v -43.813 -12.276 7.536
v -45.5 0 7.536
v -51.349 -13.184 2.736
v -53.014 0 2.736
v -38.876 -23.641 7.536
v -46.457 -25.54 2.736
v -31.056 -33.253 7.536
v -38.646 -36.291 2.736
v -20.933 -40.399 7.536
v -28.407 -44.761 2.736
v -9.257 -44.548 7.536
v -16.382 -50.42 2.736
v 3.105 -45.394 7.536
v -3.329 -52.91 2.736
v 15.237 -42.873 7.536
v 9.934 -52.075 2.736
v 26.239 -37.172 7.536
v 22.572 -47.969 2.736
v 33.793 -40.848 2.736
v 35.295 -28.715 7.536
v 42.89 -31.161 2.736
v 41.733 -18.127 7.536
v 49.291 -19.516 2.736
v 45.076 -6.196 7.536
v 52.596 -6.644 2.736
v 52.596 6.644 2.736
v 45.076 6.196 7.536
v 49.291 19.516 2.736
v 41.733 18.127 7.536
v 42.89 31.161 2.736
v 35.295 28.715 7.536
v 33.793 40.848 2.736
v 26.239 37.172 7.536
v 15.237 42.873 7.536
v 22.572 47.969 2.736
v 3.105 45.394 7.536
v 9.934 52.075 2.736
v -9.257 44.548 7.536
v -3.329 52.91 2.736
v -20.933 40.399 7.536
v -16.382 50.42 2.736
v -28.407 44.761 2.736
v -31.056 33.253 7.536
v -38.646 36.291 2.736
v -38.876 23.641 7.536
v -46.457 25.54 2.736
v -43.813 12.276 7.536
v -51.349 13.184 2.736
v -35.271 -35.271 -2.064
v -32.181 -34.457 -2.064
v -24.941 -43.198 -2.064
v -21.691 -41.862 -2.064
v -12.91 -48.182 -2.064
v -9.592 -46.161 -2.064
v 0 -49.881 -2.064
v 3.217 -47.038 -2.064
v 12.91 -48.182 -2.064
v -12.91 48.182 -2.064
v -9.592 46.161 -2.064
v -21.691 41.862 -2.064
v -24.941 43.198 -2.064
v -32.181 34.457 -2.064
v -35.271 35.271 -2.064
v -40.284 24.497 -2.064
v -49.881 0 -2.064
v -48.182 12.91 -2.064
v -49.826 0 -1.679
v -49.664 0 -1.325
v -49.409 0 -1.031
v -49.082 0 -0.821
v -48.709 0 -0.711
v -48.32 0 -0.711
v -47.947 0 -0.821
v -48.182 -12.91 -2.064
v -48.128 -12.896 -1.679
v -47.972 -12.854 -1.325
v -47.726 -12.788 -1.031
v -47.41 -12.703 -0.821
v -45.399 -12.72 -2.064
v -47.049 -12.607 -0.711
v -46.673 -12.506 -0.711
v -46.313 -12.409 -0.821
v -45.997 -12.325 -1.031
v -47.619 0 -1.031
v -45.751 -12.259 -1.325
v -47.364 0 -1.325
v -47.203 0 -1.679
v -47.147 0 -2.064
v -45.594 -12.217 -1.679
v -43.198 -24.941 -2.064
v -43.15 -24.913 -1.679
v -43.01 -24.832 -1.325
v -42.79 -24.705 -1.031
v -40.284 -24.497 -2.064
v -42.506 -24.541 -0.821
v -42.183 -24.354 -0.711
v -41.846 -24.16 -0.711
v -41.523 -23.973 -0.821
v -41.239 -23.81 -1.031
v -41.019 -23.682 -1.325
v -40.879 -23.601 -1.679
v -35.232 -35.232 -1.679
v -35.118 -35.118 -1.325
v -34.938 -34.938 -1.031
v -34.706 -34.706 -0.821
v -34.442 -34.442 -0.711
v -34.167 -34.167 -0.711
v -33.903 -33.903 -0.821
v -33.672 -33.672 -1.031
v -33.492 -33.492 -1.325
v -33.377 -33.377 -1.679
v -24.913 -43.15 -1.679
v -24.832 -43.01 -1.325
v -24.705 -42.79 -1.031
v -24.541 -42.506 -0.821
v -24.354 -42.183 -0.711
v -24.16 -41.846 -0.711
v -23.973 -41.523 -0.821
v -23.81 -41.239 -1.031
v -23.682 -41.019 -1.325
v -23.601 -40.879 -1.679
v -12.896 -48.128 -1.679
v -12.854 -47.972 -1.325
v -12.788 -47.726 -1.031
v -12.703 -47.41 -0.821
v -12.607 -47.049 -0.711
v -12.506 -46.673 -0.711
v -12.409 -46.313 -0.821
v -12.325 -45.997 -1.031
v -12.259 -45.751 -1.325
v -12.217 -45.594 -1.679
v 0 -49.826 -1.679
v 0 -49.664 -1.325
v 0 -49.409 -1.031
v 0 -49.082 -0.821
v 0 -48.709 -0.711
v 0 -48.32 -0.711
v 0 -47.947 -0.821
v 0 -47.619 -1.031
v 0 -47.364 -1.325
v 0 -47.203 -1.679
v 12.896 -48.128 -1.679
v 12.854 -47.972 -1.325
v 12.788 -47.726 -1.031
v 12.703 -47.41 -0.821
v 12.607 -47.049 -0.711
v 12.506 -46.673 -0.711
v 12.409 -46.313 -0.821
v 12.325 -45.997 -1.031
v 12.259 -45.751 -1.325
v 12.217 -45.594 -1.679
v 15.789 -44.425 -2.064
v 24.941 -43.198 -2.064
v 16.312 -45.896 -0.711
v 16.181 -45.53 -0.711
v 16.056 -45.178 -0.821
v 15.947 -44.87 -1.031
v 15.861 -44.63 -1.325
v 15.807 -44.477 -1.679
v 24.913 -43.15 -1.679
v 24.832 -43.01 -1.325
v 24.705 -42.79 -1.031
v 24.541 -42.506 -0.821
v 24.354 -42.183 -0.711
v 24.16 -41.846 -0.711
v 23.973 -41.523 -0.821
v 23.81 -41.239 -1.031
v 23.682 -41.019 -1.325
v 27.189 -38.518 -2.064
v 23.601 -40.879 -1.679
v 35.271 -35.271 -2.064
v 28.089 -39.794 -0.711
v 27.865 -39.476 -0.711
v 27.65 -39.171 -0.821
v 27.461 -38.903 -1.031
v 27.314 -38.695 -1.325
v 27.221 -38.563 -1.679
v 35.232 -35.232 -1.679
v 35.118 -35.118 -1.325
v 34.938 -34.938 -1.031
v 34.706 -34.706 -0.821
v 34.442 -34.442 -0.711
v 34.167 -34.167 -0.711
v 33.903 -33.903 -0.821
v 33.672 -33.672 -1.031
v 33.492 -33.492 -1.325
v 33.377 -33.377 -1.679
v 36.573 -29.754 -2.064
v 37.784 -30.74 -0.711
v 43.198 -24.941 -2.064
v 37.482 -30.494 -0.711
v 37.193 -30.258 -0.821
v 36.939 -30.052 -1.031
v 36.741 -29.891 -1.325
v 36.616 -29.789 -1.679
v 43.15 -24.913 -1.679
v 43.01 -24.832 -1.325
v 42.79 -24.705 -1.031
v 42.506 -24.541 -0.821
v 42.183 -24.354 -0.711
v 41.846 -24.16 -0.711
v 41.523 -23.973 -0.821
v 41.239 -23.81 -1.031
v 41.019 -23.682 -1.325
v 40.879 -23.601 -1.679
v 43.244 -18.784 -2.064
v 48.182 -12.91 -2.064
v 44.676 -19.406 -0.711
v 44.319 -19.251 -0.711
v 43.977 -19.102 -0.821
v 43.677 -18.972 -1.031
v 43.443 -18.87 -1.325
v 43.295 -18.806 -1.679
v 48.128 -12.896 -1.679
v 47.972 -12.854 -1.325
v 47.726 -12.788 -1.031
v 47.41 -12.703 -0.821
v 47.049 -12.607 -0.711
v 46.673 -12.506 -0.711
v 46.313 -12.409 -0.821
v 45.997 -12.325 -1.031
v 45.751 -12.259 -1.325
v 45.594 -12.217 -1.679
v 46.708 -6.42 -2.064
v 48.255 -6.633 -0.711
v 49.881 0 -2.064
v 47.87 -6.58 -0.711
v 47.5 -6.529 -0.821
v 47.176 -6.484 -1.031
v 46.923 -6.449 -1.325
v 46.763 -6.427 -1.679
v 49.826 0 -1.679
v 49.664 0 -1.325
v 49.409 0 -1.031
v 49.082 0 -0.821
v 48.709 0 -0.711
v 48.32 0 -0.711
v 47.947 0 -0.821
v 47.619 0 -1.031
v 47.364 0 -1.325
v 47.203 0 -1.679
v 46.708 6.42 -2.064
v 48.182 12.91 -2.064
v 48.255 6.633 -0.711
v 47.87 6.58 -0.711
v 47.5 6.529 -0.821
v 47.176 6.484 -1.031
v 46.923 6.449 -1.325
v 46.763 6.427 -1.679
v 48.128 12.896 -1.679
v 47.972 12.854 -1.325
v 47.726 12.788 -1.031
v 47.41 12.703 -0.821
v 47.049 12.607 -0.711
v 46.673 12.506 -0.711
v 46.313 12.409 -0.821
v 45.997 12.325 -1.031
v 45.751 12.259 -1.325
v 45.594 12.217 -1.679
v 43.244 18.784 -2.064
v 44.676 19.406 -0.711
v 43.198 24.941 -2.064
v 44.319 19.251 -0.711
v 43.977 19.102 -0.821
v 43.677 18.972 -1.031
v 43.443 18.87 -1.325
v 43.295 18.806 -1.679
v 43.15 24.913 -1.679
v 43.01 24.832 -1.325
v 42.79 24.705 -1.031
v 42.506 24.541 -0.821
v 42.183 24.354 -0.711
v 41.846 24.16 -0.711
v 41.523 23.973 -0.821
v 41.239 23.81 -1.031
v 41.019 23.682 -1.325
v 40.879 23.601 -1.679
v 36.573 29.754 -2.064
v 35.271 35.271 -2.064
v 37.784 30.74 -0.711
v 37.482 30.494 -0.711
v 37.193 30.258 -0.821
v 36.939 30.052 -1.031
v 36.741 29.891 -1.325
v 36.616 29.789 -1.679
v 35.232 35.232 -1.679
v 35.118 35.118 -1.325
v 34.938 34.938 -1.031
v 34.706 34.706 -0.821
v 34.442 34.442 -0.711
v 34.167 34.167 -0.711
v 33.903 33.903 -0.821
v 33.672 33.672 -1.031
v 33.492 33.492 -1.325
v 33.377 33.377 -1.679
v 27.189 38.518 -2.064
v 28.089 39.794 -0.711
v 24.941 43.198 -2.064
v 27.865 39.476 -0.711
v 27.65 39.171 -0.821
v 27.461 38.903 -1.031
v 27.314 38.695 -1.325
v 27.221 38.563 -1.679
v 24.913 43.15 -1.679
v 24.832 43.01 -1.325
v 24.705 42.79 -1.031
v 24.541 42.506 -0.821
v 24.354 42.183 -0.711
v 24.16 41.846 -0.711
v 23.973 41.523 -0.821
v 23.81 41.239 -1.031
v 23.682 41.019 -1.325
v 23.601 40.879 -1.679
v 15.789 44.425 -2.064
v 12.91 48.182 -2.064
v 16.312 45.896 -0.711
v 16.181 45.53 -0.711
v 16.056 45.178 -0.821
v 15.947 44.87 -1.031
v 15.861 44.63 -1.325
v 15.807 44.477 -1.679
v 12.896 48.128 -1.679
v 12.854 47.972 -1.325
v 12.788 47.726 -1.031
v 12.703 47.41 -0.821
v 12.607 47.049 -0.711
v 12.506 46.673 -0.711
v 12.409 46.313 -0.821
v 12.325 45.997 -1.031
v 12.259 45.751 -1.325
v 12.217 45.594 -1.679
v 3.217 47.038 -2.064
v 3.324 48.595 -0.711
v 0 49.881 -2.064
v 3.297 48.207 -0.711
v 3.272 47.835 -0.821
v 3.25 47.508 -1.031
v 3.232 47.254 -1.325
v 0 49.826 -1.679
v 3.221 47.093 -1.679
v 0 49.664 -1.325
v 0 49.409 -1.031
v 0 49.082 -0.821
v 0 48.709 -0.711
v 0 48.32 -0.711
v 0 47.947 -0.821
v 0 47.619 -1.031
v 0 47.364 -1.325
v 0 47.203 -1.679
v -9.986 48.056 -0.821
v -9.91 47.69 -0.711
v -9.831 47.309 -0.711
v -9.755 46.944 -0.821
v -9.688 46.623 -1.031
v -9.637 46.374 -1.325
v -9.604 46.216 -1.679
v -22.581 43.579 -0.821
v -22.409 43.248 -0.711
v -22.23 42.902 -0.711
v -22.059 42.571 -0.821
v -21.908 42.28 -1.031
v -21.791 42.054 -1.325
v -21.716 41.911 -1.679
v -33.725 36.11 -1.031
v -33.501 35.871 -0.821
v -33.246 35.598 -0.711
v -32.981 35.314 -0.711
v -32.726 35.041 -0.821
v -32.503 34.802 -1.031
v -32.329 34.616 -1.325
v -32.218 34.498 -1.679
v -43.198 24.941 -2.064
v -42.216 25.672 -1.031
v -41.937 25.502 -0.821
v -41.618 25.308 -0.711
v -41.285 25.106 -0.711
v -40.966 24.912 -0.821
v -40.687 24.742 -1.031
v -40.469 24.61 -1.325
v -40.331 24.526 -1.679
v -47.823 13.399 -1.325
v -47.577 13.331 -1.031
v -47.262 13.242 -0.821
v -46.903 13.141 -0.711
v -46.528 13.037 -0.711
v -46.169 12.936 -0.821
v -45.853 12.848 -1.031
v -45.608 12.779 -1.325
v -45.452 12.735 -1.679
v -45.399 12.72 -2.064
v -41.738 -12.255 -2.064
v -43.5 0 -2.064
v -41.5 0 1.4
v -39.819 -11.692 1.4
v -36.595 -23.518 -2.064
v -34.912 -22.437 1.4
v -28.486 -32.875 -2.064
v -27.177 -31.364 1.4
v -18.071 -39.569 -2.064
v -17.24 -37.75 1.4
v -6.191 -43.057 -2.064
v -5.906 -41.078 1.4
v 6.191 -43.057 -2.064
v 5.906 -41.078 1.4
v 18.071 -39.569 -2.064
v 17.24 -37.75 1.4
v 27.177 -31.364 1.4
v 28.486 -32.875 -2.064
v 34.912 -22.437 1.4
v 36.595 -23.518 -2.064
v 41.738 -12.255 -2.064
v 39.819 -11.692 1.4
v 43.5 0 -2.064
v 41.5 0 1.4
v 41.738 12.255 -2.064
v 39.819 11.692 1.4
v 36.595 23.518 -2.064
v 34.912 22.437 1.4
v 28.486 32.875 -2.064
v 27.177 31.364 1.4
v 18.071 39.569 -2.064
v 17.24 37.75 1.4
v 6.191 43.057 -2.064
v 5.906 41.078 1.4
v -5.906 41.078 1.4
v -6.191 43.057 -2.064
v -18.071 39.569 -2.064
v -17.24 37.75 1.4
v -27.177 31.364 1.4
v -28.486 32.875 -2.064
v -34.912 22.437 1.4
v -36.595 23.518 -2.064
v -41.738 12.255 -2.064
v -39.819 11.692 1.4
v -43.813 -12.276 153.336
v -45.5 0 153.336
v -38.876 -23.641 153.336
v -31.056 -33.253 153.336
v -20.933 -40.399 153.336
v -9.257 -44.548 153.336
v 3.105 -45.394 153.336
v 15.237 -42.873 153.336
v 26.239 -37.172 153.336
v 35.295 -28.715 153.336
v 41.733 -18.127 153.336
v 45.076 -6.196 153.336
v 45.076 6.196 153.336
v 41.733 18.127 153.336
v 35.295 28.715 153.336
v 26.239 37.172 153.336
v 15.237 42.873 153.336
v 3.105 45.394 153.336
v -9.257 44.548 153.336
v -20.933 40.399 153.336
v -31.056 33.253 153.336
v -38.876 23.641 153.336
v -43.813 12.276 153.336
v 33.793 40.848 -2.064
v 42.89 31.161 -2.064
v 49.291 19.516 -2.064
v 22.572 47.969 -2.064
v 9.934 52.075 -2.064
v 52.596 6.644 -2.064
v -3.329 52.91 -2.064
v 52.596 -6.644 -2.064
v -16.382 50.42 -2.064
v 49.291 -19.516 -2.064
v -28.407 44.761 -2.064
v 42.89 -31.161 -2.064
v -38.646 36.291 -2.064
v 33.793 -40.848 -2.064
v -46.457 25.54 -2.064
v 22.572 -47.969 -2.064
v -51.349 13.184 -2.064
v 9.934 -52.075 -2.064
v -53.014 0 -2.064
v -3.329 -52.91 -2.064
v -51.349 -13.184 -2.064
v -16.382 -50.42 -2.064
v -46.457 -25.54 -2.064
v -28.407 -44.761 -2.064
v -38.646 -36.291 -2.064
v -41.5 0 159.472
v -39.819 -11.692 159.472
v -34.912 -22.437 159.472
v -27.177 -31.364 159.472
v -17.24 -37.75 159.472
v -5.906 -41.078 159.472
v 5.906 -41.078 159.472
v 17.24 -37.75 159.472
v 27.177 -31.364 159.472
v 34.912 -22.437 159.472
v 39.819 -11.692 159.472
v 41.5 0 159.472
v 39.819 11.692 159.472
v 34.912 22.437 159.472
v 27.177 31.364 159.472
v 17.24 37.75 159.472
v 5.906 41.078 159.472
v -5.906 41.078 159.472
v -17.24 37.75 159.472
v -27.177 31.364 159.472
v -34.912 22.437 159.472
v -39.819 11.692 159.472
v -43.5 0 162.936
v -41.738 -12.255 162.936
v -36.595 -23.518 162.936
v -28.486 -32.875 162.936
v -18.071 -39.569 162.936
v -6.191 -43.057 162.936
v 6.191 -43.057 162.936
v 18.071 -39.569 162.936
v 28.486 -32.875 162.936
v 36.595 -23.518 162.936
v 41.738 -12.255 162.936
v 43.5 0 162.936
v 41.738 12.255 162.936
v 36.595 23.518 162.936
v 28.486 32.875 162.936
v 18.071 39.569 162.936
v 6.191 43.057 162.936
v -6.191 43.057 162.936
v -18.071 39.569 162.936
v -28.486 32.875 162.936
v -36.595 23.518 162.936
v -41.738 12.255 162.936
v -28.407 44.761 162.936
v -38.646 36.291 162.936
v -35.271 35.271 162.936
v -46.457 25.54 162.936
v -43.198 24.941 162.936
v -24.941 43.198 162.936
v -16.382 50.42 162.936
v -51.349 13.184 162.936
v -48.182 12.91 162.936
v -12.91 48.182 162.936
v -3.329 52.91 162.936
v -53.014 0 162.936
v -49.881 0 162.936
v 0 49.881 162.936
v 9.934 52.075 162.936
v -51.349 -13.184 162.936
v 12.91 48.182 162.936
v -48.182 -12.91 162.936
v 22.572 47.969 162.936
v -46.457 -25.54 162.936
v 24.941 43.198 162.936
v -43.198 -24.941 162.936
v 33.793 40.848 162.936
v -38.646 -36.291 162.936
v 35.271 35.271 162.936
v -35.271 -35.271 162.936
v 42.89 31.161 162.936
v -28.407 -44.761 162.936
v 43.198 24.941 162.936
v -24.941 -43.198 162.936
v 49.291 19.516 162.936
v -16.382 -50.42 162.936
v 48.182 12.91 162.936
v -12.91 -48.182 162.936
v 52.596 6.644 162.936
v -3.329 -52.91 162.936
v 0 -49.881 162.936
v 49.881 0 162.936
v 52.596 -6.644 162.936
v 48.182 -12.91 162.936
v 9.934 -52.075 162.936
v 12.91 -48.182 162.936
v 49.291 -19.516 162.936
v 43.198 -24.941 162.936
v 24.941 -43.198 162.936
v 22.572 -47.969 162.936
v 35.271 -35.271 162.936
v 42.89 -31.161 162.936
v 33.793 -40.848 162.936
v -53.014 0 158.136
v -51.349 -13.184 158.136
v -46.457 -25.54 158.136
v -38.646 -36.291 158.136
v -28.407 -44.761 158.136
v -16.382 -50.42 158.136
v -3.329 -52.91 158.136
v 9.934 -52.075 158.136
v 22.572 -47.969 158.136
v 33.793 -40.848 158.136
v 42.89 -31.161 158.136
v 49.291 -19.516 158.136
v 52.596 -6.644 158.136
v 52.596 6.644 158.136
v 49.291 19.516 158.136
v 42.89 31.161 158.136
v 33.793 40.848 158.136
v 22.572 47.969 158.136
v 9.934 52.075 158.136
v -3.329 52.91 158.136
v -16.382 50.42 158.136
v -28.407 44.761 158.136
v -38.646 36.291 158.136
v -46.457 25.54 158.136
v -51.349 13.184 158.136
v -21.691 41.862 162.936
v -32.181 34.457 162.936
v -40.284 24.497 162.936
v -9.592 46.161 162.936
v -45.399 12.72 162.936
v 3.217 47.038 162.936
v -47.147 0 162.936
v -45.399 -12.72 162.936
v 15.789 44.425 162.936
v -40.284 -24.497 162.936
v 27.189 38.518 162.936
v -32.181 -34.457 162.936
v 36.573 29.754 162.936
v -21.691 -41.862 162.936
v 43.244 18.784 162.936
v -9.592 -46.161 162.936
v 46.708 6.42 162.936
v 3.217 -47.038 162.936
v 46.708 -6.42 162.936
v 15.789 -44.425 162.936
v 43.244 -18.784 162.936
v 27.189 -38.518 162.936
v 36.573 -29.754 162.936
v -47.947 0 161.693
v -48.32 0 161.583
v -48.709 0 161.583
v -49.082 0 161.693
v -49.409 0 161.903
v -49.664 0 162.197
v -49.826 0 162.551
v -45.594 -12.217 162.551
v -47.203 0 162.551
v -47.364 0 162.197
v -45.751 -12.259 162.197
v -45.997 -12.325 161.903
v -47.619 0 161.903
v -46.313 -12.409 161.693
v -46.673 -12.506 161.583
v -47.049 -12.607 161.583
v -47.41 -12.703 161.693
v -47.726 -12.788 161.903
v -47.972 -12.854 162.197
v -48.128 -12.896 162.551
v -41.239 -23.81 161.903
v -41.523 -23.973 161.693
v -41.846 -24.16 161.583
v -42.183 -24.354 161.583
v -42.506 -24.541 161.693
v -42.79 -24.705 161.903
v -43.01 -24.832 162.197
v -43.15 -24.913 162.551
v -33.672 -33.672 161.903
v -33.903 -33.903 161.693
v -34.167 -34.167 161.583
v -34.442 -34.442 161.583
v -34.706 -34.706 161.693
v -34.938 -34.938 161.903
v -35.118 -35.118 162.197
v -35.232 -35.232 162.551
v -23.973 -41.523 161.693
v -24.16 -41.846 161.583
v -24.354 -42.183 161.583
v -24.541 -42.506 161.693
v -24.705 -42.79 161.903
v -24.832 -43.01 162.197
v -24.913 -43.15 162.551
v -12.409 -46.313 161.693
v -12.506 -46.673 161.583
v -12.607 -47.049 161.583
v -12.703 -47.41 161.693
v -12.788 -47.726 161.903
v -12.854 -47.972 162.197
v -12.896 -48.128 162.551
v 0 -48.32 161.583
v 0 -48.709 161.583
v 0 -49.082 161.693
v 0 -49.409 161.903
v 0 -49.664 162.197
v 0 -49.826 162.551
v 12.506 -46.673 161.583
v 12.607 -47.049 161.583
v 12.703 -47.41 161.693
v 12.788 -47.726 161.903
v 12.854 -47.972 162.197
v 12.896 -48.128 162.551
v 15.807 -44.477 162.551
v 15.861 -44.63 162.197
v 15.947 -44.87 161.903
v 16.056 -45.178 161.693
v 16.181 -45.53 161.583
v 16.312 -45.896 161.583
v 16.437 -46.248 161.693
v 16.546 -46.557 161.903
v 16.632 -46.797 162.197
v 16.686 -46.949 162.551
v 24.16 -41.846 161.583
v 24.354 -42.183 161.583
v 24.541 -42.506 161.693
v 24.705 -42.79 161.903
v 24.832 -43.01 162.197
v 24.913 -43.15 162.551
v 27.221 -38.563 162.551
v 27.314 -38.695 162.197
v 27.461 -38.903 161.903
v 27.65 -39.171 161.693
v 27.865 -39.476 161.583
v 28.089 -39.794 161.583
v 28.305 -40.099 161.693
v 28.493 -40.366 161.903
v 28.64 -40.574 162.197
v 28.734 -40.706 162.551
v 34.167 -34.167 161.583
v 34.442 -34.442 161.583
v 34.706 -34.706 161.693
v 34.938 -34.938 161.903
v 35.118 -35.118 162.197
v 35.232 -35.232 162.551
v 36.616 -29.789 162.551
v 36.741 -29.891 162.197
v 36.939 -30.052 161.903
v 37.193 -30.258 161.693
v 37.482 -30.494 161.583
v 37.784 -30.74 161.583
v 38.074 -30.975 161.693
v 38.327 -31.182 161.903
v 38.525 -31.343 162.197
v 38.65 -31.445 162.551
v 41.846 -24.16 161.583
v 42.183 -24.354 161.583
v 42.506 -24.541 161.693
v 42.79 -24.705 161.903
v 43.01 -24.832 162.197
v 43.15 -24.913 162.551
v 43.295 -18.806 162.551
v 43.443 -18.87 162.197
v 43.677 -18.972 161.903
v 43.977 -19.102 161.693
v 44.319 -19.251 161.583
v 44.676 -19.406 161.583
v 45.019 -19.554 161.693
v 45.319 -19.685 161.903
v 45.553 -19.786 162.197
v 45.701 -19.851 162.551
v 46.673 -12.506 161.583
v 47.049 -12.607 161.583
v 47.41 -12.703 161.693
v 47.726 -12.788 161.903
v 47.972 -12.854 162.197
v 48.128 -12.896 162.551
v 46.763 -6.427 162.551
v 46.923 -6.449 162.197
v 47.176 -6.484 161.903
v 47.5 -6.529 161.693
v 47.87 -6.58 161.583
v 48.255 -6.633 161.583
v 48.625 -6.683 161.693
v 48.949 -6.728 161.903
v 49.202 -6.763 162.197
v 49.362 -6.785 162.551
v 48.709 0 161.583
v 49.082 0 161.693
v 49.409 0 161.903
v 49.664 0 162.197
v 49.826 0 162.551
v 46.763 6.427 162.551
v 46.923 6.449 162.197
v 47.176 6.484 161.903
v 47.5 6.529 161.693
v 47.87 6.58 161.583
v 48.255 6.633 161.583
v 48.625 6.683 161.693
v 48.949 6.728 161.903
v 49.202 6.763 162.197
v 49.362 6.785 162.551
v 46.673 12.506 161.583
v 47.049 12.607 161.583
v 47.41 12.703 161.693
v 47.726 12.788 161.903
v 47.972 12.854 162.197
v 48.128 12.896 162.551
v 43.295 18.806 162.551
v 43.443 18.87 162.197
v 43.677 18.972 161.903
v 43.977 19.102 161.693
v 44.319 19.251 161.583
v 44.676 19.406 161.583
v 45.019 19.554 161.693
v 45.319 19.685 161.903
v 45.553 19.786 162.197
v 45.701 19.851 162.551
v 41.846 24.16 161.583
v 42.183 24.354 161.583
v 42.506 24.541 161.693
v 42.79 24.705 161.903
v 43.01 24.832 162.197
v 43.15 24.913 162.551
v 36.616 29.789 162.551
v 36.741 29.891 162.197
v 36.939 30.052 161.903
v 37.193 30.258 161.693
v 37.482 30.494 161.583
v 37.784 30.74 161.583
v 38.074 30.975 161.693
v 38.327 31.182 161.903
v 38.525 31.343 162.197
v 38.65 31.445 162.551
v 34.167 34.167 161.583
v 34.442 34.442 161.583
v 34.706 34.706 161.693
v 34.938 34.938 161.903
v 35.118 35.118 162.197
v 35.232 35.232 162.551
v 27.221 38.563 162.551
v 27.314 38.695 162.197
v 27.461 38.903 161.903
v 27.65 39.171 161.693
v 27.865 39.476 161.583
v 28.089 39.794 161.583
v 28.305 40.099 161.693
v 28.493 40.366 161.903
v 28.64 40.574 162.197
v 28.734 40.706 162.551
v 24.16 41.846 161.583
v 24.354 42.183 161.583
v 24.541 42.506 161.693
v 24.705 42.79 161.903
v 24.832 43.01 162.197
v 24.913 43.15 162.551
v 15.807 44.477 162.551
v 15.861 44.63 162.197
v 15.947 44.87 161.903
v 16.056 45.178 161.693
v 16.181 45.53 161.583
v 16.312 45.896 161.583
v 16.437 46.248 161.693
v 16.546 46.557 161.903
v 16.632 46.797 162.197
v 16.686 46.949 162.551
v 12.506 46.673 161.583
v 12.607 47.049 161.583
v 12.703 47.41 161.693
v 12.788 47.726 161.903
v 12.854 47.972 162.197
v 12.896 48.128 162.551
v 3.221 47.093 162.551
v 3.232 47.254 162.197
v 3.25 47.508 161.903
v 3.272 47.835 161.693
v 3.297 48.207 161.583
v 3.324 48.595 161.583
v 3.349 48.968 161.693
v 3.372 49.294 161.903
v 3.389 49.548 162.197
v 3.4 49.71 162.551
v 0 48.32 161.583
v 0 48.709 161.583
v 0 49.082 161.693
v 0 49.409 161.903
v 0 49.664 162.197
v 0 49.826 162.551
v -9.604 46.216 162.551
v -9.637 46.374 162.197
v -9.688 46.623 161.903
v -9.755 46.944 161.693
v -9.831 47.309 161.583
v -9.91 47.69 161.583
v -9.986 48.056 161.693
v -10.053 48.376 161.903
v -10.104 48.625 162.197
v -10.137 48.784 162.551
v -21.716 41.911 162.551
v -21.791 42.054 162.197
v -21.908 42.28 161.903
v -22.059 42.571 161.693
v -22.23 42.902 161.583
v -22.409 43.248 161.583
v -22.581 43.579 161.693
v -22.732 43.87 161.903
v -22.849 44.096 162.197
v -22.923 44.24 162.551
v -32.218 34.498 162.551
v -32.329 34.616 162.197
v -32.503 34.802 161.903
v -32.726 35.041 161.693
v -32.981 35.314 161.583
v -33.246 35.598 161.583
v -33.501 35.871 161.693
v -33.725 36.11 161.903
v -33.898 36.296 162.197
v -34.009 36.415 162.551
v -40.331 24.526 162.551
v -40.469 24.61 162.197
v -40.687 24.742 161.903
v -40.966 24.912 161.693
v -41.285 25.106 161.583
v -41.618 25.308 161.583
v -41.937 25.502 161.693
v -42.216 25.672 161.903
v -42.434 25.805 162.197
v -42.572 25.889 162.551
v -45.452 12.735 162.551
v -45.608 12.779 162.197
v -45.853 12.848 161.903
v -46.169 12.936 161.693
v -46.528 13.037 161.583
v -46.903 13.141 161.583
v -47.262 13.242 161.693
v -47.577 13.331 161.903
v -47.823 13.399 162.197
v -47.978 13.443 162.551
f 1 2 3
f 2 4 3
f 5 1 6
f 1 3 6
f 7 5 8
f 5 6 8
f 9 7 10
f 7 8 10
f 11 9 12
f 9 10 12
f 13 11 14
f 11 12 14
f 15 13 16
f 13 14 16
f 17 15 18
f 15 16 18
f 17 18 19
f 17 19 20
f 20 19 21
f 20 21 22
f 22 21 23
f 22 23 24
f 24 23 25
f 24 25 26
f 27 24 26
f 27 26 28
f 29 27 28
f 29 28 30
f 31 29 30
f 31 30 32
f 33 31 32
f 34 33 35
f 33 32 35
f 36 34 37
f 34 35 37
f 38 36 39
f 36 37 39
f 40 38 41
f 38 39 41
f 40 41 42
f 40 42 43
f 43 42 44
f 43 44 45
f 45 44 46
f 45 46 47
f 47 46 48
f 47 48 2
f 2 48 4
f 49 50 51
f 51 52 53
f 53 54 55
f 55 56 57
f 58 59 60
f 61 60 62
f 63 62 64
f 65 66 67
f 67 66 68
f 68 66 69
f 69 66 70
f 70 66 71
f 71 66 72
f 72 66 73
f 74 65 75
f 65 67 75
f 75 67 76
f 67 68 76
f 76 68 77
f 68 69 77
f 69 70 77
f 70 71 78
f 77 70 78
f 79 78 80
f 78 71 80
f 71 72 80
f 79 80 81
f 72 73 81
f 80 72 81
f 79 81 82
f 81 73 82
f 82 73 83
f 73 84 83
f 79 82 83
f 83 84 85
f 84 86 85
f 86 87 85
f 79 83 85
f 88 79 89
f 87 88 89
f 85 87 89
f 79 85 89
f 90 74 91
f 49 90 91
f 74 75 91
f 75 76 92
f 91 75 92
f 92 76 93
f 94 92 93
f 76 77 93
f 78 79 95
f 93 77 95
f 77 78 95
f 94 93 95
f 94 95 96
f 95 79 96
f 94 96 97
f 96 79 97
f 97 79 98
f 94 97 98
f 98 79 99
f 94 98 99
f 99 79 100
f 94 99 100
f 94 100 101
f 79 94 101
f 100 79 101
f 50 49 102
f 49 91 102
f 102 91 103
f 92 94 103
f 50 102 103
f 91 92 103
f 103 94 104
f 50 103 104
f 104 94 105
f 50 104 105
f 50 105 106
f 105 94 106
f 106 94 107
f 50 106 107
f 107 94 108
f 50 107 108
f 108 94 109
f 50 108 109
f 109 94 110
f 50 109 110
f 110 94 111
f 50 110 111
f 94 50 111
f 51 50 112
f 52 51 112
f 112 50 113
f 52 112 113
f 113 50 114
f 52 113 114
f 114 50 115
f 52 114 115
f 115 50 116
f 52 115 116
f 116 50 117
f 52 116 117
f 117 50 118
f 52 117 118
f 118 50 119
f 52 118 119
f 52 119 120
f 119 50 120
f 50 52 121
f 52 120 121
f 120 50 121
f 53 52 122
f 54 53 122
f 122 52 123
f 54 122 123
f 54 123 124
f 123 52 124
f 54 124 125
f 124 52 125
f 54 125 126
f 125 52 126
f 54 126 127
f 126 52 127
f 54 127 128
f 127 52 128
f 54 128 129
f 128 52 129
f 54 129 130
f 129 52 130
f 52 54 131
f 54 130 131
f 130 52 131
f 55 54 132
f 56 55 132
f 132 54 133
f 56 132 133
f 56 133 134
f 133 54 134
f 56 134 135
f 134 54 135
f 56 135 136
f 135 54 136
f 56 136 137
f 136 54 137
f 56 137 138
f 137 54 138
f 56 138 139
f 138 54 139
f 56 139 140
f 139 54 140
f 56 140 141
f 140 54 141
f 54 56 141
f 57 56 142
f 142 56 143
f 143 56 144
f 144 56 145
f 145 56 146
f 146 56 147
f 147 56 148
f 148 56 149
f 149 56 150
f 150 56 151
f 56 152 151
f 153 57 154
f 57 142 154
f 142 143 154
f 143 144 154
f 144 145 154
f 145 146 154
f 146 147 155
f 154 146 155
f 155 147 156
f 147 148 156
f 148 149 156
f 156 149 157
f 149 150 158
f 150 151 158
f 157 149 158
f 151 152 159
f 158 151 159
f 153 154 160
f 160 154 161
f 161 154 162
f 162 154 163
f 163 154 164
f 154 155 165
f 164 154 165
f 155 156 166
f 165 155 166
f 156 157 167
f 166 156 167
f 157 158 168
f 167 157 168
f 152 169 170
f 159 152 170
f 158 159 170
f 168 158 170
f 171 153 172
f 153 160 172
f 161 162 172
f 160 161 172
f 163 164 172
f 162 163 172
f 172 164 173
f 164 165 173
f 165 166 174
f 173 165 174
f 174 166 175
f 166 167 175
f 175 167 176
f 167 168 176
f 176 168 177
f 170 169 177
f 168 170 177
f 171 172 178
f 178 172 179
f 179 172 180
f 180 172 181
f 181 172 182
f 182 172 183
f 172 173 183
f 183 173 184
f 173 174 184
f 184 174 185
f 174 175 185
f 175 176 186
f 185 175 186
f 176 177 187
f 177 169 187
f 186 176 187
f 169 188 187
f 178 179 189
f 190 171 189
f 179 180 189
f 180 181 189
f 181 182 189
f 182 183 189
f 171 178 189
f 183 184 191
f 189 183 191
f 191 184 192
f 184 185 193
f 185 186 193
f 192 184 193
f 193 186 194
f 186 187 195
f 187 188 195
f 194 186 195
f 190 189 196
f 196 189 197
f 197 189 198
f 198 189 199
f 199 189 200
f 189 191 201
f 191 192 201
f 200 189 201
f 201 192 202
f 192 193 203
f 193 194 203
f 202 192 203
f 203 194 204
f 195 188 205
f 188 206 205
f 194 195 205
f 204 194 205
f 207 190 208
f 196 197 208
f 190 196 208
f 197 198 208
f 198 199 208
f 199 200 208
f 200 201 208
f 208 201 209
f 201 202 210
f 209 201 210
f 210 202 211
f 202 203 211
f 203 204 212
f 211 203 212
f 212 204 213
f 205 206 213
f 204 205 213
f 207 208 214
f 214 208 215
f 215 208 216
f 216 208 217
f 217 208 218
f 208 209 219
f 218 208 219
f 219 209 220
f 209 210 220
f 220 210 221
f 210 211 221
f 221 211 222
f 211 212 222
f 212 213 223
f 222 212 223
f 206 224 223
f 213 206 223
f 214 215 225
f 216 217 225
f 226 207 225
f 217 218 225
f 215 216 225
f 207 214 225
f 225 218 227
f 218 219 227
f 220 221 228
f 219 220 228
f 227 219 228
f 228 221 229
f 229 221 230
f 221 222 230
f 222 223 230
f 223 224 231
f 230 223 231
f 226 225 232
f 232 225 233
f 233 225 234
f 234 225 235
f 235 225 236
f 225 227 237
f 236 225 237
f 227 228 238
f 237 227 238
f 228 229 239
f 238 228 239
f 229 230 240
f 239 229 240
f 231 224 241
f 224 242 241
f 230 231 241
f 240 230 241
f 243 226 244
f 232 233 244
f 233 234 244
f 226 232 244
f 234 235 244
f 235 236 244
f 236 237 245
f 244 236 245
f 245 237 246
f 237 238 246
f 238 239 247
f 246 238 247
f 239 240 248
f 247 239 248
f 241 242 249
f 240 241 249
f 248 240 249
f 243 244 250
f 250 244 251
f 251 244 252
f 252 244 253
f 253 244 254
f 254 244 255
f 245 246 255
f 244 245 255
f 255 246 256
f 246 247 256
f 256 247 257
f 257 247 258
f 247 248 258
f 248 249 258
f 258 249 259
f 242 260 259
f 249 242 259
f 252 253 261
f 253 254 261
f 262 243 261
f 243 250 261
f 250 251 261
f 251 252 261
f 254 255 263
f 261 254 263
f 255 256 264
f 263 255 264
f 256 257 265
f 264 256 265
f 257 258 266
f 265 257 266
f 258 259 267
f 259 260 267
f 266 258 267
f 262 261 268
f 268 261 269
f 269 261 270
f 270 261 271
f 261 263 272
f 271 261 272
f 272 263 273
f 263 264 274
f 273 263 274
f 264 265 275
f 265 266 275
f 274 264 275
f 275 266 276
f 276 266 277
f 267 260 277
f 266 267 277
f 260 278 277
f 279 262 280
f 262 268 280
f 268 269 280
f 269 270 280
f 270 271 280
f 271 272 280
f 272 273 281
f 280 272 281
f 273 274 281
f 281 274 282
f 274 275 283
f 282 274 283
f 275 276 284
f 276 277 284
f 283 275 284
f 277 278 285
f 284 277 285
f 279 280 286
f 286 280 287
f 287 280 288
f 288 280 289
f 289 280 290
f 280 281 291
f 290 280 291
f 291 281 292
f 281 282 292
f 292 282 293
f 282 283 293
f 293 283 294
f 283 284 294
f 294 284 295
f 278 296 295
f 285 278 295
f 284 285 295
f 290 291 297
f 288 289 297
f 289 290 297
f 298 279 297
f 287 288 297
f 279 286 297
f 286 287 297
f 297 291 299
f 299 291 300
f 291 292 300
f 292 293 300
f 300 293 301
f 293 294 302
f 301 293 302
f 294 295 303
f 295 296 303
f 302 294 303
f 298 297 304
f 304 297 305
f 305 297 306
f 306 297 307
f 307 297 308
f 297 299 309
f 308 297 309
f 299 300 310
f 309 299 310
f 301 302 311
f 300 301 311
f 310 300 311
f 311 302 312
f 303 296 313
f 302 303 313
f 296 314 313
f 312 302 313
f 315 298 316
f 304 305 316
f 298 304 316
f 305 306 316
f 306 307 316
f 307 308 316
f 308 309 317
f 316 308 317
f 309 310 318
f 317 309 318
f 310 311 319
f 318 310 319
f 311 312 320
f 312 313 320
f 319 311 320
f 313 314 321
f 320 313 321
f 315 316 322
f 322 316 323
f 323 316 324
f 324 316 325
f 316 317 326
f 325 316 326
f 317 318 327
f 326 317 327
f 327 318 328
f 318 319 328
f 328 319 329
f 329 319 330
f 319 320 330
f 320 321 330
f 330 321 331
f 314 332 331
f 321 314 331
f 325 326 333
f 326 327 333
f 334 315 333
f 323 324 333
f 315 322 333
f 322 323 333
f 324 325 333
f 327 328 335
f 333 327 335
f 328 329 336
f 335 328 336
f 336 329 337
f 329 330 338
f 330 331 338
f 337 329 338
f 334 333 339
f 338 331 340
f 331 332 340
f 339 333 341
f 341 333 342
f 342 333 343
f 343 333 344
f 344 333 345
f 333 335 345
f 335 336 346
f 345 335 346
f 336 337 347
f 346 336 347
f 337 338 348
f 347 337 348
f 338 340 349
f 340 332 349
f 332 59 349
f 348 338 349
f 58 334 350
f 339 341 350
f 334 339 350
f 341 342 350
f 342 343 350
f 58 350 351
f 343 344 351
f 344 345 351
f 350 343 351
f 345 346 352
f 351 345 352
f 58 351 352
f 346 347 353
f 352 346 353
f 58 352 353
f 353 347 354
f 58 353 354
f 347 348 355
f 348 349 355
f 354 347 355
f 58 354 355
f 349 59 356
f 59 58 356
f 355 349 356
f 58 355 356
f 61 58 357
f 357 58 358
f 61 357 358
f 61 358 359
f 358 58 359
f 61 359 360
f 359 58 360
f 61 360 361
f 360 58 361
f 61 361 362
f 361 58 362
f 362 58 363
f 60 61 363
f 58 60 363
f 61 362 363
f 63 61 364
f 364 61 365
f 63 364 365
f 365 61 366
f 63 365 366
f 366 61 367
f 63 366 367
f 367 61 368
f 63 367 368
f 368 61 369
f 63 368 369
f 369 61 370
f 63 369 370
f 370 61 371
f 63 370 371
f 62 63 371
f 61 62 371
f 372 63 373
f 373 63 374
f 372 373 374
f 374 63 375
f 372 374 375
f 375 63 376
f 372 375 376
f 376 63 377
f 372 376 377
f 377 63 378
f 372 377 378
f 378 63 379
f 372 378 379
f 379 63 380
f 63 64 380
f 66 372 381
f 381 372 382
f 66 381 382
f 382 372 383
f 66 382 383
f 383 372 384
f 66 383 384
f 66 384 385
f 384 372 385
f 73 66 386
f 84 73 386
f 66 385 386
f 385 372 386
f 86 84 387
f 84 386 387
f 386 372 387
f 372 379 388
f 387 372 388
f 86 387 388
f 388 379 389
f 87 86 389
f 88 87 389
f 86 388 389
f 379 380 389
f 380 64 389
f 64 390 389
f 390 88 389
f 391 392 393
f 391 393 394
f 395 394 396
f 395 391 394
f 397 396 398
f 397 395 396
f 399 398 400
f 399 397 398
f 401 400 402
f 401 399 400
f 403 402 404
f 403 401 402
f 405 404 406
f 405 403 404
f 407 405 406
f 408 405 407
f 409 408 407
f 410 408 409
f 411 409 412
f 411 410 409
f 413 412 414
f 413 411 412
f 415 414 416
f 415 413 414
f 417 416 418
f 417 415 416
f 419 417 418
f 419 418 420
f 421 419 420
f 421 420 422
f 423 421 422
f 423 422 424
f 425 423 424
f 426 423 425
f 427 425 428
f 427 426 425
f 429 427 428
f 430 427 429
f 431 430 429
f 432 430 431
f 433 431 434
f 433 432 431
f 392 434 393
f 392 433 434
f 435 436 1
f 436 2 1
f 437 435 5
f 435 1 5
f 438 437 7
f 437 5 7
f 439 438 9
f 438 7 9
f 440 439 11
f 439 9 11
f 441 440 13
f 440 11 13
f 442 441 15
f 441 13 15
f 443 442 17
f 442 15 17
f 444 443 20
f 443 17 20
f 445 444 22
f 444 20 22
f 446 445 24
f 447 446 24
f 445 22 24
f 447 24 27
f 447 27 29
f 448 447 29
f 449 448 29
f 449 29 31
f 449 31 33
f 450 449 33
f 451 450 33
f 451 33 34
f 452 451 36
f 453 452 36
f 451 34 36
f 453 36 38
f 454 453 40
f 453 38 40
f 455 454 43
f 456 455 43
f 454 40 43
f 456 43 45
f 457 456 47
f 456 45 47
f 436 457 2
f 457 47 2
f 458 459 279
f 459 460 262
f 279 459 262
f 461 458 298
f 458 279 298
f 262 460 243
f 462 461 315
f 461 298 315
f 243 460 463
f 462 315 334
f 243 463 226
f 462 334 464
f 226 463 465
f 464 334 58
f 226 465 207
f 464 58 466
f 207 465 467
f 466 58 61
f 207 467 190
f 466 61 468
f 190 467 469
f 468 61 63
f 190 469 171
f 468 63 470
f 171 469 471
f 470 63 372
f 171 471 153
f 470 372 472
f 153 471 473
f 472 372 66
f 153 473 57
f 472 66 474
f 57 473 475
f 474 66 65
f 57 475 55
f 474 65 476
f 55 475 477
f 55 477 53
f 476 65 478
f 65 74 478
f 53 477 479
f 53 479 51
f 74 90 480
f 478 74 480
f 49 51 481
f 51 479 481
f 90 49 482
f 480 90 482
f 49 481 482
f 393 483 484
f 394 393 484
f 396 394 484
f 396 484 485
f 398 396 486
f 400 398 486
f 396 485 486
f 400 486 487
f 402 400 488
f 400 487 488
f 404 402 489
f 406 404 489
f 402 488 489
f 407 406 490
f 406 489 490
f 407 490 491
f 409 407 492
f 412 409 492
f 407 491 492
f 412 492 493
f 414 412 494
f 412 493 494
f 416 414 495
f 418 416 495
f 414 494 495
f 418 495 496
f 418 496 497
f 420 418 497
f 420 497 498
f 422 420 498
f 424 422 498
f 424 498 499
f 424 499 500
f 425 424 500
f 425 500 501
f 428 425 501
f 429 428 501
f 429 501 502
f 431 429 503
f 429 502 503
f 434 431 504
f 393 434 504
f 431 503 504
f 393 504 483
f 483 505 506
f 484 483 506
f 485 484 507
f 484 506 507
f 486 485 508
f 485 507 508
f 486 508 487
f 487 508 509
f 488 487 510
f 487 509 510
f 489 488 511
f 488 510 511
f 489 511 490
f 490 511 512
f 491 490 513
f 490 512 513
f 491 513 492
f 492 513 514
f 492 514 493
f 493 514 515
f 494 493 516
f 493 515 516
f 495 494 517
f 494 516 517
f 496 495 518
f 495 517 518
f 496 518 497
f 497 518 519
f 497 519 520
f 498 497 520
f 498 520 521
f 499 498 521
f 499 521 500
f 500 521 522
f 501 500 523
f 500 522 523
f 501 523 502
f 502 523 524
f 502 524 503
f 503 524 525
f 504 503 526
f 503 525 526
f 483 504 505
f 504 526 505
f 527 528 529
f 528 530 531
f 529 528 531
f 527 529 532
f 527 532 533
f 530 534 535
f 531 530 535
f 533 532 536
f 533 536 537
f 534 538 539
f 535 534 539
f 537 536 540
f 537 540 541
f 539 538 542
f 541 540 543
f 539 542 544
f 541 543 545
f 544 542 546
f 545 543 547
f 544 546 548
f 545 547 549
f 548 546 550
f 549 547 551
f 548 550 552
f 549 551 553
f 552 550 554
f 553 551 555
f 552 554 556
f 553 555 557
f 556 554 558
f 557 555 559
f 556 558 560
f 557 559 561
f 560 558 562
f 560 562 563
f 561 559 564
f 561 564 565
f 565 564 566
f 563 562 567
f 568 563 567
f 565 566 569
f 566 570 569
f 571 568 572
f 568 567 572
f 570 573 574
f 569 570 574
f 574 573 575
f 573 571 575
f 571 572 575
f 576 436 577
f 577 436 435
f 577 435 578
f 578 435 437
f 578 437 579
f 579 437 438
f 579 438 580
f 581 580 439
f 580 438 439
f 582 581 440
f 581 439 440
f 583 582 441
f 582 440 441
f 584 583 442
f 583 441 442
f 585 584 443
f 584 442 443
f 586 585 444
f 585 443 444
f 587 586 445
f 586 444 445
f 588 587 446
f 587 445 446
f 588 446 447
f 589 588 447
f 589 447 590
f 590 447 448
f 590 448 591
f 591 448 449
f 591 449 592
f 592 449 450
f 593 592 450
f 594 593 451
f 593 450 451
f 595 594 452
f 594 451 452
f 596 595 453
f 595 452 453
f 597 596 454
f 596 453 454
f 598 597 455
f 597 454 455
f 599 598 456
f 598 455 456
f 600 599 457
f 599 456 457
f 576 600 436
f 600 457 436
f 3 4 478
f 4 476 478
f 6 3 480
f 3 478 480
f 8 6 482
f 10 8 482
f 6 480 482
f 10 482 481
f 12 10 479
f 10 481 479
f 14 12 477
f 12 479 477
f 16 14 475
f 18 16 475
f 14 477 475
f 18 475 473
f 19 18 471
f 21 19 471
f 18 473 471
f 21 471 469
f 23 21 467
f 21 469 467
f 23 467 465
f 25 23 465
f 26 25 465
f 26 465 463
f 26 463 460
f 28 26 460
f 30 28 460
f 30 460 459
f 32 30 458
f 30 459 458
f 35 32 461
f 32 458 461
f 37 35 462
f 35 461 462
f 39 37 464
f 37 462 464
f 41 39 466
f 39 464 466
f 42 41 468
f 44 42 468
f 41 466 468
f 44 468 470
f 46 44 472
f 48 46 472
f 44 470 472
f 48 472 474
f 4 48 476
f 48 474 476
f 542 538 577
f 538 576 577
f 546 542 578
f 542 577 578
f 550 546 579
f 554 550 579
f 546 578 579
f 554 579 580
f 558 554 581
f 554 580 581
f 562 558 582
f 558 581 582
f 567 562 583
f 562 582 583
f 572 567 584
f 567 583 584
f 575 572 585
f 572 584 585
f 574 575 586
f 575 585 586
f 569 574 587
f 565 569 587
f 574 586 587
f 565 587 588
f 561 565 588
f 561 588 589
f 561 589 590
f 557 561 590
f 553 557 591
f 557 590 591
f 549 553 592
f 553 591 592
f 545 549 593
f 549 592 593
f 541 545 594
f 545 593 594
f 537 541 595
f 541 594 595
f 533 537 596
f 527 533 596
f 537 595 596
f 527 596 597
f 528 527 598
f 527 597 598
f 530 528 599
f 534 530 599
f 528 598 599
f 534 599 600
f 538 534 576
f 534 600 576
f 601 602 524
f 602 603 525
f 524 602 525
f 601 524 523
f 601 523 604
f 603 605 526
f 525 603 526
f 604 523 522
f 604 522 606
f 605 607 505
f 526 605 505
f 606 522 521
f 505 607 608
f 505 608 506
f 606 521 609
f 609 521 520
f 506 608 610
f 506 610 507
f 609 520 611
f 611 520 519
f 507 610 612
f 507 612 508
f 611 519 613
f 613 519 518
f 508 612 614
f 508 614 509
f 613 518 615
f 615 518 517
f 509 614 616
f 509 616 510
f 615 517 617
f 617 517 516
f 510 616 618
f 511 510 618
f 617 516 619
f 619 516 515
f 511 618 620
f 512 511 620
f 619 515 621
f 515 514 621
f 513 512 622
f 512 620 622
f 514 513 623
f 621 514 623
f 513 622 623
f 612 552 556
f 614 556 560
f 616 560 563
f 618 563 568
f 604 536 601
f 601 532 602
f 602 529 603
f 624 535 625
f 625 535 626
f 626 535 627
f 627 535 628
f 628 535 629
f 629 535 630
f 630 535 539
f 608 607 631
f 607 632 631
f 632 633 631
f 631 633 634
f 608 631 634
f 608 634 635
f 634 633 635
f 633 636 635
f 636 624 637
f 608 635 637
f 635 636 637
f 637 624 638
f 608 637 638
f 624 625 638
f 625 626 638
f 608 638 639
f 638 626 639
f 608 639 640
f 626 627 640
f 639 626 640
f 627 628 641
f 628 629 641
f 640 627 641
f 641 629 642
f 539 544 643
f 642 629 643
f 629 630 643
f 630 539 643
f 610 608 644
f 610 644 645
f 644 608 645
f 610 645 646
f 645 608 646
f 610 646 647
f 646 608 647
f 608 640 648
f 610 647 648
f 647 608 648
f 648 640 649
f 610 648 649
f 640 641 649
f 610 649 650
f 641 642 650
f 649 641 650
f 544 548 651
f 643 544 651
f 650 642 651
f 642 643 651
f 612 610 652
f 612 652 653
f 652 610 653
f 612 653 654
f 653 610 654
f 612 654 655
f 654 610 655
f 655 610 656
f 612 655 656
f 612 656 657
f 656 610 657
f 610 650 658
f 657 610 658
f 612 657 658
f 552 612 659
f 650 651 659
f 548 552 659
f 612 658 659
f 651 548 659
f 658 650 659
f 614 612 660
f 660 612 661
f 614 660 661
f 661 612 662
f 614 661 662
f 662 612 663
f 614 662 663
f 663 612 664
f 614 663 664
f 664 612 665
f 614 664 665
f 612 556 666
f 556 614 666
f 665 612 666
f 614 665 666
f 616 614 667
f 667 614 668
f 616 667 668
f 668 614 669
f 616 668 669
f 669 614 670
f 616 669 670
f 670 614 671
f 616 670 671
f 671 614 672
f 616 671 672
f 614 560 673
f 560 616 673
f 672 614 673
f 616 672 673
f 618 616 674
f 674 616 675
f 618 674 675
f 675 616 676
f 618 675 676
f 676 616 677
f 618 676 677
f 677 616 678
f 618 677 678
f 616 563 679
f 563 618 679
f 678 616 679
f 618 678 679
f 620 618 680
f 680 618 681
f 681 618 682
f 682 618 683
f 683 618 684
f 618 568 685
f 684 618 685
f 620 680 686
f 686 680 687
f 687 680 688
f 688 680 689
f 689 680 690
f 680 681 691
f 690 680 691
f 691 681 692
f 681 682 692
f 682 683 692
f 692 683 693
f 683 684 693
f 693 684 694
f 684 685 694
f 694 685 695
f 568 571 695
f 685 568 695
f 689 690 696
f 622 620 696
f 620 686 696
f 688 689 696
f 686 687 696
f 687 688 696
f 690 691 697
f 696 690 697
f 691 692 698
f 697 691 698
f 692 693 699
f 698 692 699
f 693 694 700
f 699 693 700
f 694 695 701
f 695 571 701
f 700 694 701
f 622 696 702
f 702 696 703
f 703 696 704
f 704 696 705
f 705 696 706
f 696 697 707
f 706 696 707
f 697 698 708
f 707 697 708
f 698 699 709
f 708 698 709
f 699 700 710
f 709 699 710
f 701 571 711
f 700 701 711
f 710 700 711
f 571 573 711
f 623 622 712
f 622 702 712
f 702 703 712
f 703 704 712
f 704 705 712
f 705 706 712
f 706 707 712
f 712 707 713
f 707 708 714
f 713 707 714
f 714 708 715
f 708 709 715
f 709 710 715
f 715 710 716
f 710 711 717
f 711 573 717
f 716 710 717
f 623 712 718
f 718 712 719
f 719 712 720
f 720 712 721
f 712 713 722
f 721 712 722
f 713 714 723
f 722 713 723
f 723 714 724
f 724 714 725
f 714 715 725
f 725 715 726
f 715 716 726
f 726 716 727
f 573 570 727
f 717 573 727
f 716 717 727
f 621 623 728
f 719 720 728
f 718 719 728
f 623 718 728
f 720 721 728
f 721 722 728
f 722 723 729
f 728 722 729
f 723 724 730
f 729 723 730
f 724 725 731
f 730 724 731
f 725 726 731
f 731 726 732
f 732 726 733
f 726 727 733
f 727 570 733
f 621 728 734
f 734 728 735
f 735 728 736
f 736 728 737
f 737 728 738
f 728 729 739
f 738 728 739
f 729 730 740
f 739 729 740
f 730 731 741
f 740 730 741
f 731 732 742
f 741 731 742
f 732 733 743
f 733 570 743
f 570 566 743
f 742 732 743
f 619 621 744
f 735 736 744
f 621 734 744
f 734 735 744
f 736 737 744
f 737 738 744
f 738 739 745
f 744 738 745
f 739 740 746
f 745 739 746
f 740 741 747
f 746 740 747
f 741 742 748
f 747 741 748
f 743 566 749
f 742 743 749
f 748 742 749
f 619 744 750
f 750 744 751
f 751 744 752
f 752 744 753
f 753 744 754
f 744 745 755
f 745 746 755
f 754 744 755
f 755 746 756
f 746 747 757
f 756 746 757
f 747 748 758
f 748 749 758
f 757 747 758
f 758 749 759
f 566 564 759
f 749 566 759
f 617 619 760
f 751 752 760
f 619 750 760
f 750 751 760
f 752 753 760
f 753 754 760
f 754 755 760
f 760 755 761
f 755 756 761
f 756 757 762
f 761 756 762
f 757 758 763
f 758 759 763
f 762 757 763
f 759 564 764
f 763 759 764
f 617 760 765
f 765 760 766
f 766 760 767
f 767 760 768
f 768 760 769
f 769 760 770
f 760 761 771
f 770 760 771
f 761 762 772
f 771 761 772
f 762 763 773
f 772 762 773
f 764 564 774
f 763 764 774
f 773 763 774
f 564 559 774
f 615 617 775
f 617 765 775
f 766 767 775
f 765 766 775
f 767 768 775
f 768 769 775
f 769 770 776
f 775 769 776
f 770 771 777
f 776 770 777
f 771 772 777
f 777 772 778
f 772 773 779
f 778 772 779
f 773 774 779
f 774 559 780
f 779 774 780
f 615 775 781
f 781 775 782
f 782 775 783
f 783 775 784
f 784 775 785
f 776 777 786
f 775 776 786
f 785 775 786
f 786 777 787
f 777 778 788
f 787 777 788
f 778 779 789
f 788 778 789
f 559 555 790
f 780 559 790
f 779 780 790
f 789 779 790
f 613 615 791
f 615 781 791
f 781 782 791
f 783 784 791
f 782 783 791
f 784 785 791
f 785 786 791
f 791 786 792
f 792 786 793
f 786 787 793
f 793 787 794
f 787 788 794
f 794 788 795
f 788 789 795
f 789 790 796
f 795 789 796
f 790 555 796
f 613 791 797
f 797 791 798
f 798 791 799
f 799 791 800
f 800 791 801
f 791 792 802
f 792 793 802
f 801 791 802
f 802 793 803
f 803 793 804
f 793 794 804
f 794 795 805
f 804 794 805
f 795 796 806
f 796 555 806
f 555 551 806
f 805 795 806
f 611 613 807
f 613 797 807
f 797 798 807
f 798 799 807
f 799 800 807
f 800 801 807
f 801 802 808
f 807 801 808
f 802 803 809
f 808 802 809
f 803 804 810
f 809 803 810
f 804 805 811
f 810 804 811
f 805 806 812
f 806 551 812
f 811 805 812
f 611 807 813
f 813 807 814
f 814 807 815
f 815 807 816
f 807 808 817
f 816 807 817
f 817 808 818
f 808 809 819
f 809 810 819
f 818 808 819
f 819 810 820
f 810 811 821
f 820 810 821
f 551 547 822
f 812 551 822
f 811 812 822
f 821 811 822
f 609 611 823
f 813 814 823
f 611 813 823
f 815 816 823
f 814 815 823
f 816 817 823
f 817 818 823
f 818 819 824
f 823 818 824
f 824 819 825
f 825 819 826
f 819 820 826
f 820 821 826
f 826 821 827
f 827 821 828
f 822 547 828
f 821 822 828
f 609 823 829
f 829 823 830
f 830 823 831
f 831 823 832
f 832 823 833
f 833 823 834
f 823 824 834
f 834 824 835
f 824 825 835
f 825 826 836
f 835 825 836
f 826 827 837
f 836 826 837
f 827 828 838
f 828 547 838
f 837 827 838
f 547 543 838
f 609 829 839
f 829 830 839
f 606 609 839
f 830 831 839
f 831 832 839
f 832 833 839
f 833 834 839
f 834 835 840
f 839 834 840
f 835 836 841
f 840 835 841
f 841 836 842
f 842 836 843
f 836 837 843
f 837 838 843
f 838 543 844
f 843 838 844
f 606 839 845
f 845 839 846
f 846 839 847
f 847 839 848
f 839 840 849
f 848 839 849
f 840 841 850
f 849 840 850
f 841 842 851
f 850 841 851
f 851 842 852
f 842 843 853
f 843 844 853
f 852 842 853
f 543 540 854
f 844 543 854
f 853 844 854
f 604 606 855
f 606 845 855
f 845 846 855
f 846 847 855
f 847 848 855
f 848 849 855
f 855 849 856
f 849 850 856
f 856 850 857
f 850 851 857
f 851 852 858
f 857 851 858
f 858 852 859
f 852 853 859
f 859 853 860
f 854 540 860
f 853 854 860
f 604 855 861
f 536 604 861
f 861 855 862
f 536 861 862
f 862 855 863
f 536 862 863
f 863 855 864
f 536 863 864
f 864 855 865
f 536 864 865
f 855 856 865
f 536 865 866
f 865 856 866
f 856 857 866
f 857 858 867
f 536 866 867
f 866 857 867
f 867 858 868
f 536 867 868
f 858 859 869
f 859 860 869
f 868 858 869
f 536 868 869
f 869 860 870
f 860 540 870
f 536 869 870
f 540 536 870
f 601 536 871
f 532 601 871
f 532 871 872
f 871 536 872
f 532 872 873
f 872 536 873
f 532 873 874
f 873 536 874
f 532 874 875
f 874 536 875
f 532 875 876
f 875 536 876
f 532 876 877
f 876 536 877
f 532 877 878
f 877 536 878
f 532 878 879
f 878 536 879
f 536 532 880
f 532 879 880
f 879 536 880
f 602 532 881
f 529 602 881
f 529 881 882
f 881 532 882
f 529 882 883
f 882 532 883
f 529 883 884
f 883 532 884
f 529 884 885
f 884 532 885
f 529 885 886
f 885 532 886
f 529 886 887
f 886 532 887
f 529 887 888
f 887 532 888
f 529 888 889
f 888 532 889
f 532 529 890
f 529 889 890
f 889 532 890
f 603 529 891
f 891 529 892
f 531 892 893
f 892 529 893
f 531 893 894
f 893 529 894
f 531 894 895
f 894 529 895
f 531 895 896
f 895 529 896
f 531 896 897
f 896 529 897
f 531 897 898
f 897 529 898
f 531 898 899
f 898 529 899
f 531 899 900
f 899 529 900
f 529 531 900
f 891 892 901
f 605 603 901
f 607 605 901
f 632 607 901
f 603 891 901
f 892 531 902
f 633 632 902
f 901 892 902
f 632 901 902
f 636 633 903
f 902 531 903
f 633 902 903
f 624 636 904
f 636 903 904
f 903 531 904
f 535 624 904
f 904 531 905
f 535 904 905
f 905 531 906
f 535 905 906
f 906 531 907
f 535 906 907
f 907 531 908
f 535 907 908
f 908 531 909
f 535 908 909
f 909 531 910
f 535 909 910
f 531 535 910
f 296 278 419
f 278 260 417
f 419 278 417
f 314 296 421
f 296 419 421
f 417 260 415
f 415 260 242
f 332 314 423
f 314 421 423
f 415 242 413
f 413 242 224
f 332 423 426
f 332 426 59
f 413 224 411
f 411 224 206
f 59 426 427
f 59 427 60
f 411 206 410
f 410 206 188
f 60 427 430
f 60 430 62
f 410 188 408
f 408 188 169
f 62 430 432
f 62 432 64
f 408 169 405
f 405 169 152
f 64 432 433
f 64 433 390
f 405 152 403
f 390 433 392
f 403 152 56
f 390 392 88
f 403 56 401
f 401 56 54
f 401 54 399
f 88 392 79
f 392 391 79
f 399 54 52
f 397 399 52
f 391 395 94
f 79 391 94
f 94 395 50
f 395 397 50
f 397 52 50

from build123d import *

# Parameters (mm, degrees)
F2_SIZE2 = 2
F2_SIZE  = 3.4641016151


with BuildPart() as f1:
    # F0 (on Front) → F1 (revolve)
    with BuildSketch(Plane.XZ):
        with BuildLine():
            Line((-47.1474705863, -2.0639507875), (-45.5, -2.0639507875))
            Line((-45.5, -2.0639507875), (-41.5, -2.0639507875))
            Line((-41.5, -2.0639507875), (-41.5, 80.4360492125))
            Line((-41.5, 80.4360492125), (-45.5, 80.4360492125))
            Line((-45.5, 80.4360492125), (-45.5, 18.9360492125))
            Line((-45.5, 18.9360492125), (-45.5, 7.5360492125))
            Line((-45.5, 7.5360492125), (-53.0143515468, 2.7360492125))
            Line((-53.0143515468, 2.7360492125), (-53.0143515468, -2.0639507875))
            Line((-53.0143515468, -2.0639507875), (-49.8812325073, -2.0639507875))
            ThreePointArc((-49.8812325073, -2.0639507875), (-48.5143515468, -0.697069827), (-47.1474705863, -2.0639507875))
        make_face()
        with BuildLine():
            Line((-45.5, 80.4360492125), (-41.5, 80.4360492125))
            Line((-41.5, 80.4360492125), (-41.5, 162.9360492125))
            Line((-41.5, 162.9360492125), (-45.5, 162.9360492125))
            Line((-45.5, 162.9360492125), (-47.1474705863, 162.9360492125))
            ThreePointArc((-47.1474705863, 162.9360492125), (-48.5143515468, 161.569168252), (-49.8812325073, 162.9360492125))
            Line((-49.8812325073, 162.9360492125), (-53.0143515468, 162.9360492125))
            Line((-53.0143515468, 162.9360492125), (-53.0143515468, 158.1360492125))
            Line((-53.0143515468, 158.1360492125), (-45.5, 153.3360492125))
            Line((-45.5, 153.3360492125), (-45.5, 141.9360492125))
            Line((-45.5, 141.9360492125), (-45.5, 80.4360492125))
        make_face()
    revolve(axis=Axis((0, 0, 19.3934533745), (0, 0, 1)))

    # F2
    f2_edges = [f1.edges().sort_by_distance(p)[0] for p in [
        (41.5, 0, 162.936049),
        (41.5, 0, -2.063951),
    ]]
    f2_side = f1.faces().sort_by_distance((41.5, 0, 80.436049))[0]
    chamfer(f2_edges, length=F2_SIZE, length2=F2_SIZE2, reference=f2_side)


solid = f1.part
